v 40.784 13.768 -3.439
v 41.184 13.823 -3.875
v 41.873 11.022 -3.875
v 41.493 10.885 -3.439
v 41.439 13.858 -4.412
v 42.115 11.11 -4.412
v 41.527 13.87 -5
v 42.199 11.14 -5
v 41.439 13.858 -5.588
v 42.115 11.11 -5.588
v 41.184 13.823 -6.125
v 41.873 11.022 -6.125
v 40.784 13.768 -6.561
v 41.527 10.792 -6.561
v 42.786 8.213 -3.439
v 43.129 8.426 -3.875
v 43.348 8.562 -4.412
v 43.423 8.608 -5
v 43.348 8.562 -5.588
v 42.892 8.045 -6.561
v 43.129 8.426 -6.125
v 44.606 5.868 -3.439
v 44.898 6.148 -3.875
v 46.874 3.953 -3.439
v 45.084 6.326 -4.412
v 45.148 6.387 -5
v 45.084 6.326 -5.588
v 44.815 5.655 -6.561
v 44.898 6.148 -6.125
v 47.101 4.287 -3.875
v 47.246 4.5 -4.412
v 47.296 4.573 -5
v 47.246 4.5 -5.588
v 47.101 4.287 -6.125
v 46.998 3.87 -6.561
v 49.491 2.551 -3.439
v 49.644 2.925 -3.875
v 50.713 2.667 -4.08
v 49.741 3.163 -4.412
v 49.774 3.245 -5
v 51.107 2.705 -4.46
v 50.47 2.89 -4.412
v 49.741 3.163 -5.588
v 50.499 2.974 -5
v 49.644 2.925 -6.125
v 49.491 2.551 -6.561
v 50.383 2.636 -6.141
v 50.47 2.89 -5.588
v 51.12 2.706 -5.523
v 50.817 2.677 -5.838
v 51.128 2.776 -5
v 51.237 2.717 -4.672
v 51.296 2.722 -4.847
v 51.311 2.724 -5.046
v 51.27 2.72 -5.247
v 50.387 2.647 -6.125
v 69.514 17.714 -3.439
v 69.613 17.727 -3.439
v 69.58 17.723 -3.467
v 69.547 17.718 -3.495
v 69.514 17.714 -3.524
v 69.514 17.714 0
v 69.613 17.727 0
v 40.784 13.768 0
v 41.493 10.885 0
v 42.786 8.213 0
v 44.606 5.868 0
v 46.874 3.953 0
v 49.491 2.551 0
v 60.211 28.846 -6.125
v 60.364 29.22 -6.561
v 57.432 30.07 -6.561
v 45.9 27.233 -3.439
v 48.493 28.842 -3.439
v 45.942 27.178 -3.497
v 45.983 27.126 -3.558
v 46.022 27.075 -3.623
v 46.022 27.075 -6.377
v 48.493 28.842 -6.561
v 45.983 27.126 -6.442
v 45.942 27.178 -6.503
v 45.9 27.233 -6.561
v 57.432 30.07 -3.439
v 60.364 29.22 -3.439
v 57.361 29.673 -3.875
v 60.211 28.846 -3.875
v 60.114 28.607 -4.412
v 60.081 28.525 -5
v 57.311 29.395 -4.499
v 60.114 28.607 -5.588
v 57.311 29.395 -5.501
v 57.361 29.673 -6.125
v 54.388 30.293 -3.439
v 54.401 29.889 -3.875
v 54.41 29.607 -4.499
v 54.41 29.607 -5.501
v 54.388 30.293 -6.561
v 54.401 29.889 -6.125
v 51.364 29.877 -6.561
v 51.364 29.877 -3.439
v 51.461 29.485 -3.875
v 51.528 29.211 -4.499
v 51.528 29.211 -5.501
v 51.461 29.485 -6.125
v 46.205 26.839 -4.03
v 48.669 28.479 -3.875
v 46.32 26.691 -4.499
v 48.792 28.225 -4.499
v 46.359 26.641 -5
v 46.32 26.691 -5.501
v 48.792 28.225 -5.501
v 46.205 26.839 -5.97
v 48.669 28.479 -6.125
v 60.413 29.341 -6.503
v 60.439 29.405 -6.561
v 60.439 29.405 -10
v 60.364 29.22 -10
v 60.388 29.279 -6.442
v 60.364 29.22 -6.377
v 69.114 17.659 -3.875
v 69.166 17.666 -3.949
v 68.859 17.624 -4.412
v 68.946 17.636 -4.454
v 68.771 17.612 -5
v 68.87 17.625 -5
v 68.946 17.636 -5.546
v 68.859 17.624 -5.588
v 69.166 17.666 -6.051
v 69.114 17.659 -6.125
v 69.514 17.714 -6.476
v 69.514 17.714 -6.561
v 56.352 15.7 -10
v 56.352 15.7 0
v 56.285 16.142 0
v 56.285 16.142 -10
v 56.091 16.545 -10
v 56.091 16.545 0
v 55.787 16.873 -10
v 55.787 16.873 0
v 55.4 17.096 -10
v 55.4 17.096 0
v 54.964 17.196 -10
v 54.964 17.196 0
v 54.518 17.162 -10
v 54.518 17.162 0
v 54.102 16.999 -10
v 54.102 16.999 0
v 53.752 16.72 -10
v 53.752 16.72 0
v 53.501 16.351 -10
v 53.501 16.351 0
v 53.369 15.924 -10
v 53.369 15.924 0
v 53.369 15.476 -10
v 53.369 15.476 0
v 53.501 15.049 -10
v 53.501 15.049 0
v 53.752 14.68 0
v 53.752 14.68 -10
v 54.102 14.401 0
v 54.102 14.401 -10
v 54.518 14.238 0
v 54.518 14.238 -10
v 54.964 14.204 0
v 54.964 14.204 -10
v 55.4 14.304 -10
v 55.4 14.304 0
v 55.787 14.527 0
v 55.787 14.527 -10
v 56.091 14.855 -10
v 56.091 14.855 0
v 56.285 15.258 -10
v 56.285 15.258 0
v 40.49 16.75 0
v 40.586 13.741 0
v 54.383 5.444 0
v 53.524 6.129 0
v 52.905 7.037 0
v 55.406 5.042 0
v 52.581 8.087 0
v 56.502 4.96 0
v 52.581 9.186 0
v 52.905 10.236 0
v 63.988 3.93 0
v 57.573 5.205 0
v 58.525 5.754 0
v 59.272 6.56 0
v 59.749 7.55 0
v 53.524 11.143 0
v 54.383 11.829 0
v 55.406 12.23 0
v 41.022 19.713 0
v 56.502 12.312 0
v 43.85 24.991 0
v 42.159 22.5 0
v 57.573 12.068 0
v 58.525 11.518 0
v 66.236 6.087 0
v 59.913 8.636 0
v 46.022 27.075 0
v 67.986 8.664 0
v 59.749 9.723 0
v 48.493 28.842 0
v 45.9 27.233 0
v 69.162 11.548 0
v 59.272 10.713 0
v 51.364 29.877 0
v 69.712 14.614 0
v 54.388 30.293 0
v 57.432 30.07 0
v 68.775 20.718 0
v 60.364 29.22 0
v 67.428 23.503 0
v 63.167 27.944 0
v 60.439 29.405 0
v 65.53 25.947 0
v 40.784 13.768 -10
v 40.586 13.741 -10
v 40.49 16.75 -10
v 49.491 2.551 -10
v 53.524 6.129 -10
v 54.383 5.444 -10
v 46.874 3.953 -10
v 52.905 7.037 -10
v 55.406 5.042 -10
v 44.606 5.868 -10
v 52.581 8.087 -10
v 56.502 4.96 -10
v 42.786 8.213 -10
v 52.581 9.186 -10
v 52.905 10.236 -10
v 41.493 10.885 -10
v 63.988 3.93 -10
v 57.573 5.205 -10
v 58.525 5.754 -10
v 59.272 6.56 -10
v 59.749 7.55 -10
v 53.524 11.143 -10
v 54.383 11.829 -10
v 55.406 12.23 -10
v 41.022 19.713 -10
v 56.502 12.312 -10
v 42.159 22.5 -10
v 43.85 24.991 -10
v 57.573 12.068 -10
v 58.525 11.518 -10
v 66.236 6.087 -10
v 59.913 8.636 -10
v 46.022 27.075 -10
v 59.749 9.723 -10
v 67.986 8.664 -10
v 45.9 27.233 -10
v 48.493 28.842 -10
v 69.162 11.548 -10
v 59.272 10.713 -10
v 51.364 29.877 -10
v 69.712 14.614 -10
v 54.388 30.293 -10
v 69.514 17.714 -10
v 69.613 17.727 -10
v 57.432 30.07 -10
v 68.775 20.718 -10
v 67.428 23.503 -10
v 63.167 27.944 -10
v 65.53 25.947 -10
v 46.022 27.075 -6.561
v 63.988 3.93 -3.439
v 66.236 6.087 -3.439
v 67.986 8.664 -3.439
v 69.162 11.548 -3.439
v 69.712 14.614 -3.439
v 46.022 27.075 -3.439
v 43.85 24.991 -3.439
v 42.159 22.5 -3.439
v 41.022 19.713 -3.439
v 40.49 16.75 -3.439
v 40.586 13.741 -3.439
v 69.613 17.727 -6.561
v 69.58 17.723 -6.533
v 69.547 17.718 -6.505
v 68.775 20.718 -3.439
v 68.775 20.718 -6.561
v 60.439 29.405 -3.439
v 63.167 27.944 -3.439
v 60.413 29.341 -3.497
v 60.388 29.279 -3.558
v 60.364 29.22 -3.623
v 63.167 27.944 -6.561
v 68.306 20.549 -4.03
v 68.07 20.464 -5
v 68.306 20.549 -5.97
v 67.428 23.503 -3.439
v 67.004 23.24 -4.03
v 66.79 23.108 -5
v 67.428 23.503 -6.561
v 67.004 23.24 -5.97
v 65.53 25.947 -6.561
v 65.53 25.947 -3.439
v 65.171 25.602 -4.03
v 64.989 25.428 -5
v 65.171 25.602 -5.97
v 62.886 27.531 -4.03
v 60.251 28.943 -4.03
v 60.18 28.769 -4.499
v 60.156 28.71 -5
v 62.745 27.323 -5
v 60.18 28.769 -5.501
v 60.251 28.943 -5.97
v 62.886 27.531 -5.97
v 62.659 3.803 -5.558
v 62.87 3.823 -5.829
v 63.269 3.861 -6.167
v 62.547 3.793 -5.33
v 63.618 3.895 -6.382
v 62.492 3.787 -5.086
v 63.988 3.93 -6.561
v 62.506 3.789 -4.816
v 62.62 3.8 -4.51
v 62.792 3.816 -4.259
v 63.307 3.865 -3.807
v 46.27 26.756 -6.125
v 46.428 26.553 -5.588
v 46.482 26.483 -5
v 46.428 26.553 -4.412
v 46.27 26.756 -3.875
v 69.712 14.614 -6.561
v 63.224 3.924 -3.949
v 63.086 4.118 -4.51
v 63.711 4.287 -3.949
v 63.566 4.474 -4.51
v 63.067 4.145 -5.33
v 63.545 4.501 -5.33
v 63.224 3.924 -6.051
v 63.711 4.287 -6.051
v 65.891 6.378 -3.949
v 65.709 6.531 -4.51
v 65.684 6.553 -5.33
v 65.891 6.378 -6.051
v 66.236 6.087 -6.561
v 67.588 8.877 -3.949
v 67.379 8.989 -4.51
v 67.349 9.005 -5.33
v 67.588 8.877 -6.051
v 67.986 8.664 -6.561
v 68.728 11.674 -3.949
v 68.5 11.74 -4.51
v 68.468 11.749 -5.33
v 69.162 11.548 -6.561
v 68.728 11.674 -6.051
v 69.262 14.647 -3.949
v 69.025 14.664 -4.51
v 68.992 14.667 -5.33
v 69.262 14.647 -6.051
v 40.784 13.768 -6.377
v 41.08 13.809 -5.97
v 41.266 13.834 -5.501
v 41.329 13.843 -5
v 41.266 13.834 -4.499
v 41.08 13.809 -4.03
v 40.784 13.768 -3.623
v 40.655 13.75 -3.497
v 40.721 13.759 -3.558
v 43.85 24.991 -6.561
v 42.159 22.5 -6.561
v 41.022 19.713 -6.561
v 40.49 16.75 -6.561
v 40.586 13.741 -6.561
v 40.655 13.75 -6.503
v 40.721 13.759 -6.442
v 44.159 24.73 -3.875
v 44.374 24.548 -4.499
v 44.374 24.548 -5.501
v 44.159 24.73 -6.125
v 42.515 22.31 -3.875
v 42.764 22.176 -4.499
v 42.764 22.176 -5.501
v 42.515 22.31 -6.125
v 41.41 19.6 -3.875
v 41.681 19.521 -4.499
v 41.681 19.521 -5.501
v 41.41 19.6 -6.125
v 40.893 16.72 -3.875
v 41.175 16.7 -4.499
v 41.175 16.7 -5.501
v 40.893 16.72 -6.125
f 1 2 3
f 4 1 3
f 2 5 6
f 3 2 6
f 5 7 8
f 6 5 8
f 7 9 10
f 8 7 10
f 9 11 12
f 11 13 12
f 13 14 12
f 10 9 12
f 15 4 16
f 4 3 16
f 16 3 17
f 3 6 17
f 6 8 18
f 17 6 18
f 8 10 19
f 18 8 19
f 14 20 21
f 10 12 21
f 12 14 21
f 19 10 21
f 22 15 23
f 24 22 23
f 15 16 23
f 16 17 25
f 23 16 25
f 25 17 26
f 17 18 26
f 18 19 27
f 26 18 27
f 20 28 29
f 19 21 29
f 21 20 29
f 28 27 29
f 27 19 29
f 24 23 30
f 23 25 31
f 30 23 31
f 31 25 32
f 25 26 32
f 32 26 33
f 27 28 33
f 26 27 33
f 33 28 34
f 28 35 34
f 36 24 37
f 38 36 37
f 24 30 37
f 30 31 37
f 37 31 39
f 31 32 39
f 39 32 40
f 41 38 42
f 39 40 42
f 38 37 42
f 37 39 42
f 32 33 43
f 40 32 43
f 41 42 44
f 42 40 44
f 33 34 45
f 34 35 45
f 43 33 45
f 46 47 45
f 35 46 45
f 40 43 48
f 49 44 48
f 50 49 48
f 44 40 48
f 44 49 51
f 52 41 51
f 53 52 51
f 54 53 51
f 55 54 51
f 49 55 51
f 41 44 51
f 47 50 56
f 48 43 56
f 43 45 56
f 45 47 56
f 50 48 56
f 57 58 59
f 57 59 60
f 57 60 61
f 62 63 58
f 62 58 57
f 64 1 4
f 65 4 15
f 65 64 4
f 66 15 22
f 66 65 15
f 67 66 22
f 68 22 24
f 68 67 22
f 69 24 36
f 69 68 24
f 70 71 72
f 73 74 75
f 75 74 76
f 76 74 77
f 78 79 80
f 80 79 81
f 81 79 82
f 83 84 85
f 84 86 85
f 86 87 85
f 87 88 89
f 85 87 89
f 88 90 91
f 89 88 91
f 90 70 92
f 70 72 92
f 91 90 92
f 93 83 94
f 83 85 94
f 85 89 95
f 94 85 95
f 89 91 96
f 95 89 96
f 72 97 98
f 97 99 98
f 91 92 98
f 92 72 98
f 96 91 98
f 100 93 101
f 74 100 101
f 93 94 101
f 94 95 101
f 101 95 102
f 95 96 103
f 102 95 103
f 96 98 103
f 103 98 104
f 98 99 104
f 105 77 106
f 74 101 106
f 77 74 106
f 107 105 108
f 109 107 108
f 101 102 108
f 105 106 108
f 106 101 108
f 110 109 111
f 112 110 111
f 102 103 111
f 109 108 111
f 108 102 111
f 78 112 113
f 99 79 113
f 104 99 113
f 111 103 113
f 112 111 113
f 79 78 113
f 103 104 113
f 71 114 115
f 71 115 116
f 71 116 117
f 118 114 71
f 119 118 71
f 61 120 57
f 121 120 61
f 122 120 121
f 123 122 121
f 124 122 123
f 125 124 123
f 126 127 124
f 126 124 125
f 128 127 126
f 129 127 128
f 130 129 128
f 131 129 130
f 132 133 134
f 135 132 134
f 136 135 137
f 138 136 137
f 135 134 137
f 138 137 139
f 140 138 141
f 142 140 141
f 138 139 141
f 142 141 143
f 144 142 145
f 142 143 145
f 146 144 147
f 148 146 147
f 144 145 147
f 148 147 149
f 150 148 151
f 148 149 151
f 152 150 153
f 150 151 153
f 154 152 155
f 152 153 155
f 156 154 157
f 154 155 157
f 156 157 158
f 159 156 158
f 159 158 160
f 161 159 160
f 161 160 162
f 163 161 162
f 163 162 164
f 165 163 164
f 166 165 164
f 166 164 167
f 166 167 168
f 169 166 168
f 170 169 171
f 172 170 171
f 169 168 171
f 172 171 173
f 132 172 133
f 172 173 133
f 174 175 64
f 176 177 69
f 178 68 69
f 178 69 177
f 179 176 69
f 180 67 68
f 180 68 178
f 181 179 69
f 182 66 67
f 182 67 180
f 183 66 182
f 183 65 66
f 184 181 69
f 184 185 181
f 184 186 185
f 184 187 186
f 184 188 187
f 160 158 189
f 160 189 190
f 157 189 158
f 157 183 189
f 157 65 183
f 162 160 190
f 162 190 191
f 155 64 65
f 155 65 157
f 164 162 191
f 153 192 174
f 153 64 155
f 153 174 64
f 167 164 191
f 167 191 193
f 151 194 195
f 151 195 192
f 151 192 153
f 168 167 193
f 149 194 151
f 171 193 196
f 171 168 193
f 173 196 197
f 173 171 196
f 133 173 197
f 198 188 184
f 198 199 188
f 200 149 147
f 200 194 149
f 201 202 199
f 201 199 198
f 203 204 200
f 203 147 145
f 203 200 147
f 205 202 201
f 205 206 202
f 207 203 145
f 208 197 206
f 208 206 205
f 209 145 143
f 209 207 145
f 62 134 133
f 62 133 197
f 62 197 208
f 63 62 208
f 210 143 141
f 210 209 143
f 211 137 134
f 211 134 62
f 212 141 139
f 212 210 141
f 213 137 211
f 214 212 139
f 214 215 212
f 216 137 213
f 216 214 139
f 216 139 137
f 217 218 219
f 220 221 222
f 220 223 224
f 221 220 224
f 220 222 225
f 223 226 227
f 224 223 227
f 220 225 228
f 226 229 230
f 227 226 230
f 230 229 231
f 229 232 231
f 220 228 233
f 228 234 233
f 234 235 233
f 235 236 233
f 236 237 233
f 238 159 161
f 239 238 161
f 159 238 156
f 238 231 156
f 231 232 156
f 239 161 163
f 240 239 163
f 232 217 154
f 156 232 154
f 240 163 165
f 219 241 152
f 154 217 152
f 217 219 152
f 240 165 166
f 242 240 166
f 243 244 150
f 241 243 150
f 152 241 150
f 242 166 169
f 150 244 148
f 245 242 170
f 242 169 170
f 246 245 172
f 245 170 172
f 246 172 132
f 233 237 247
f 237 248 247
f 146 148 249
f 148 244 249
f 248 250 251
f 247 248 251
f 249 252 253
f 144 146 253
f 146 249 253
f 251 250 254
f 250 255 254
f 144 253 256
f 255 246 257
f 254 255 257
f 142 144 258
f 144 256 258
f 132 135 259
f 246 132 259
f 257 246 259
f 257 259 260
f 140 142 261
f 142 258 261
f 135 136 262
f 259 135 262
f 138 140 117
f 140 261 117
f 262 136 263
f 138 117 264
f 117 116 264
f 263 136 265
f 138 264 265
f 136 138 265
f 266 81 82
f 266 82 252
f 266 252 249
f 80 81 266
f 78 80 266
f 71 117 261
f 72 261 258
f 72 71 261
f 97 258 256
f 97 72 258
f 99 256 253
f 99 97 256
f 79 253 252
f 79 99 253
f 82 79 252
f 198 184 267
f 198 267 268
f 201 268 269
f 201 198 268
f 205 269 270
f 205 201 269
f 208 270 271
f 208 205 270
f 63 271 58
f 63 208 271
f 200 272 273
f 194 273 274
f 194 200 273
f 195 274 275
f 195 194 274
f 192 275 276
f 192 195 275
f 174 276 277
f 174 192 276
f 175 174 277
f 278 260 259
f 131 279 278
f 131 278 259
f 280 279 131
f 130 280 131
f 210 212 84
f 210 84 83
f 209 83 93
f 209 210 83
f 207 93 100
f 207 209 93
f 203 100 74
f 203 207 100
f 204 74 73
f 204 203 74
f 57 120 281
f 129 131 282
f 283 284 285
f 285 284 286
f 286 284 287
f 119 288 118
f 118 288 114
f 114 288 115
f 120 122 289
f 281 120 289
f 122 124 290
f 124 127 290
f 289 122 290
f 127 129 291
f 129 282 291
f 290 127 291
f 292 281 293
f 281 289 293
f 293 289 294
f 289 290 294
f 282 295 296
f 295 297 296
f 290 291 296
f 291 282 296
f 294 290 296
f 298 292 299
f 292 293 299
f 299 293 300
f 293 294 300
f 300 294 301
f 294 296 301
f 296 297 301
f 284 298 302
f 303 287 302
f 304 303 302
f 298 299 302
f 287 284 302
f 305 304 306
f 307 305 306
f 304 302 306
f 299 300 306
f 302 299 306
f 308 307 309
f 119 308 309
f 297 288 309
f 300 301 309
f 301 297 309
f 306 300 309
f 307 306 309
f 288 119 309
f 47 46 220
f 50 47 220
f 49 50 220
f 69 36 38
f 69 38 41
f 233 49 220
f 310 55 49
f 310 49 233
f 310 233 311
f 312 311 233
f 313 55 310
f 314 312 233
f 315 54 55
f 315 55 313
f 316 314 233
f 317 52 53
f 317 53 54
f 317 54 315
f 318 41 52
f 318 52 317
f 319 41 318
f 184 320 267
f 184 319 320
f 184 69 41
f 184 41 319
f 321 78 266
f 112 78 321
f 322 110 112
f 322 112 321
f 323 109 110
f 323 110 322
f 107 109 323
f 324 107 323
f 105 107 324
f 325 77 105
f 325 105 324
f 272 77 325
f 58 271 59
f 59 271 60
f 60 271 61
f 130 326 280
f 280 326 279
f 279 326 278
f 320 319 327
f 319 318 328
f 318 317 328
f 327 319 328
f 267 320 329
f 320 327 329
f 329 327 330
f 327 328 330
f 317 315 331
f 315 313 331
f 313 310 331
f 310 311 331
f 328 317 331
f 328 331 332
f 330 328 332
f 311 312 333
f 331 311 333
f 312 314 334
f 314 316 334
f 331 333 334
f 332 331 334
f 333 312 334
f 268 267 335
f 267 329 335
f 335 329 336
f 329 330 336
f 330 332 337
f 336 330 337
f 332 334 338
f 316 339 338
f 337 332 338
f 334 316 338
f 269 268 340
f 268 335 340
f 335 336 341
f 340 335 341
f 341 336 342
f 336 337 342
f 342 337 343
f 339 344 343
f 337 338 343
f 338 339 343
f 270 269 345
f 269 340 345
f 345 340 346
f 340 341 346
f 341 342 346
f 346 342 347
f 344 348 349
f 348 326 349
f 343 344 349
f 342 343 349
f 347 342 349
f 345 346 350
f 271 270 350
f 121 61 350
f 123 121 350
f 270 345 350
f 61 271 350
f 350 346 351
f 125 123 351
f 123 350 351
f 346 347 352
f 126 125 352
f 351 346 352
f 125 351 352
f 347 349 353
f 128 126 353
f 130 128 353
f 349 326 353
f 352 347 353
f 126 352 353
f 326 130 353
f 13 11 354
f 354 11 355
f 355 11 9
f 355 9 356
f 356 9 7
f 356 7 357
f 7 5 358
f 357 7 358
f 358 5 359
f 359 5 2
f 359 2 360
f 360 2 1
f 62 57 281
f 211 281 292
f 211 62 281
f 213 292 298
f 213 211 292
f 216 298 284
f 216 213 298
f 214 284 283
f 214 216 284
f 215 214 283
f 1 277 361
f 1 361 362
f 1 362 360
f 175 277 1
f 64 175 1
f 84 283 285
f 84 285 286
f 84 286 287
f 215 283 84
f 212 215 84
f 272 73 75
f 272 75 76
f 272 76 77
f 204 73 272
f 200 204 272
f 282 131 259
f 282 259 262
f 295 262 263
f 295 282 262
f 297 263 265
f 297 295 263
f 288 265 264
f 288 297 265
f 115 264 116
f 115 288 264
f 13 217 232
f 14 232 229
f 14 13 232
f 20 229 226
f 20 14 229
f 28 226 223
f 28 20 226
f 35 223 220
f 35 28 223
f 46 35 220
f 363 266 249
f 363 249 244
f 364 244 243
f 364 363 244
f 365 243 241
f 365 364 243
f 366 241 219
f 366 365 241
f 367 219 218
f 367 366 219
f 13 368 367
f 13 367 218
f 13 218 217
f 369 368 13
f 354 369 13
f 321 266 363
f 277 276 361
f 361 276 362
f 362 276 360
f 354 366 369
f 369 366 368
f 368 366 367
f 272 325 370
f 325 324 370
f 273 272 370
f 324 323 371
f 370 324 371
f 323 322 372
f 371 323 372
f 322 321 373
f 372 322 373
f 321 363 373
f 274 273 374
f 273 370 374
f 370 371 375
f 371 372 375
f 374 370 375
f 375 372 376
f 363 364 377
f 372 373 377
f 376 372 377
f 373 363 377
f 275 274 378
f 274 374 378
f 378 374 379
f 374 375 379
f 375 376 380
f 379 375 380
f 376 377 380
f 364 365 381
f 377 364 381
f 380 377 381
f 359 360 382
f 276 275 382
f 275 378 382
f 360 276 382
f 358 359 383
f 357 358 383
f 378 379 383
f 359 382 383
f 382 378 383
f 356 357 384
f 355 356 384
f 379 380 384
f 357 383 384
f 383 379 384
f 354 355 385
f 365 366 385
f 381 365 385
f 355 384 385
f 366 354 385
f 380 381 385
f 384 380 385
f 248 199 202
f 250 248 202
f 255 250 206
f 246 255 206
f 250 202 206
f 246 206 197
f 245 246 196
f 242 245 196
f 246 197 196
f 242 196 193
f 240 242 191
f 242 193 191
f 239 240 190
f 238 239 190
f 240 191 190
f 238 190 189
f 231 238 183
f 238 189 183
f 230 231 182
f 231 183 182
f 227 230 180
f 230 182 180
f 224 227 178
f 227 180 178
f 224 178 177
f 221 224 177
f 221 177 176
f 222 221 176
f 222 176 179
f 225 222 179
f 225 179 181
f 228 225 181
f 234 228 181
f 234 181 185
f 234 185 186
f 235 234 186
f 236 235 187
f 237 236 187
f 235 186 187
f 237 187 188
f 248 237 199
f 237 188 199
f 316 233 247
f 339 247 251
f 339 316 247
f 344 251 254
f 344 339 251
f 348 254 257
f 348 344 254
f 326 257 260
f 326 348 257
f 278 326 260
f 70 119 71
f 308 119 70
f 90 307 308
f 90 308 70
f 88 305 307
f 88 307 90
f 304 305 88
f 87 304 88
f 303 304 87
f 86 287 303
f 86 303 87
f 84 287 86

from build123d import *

# Parameters (mm, degrees)
SKETCH1_R           = 3.686275202
SKETCH1_R_2         = 1.5
BOSS_EXTRUDE1_DEPTH = 10
CUT_SWEEP1_ANGLE    = 65.162978
SKETCH3_R           = 2
SKETCH4_R           = 2
SKETCH5_R           = 2
CUT_SWEEP5_ANGLE    = 66.926183


# Read off the part's stored shape, not the designer's step: Cut-Sweep1, Cut-Sweep5
with BuildPart() as part:
    # Sketch1 → Boss-Extrude1 (new body)
    with BuildSketch(Plane.XY):
        with BuildLine():
            Line((49.491190341, 2.55078162), (63.988368206, 3.929851578))
            ThreePointArc((63.988368206, 3.929851578), (68.649398374, 10.07494702), (69.613421186, 17.727270865))
            Line((69.613421186, 17.727270865), (69.514351105, 17.71366502))
            ThreePointArc((69.514351105, 17.71366502), (66.543133225, 24.775071071), (60.439280034, 29.404819157))
            Line((60.439280034, 29.404819157), (60.363775967, 29.219618898))
            ThreePointArc((60.363775967, 29.219618898), (52.865525757, 30.164231855), (45.899544112, 27.233165568))
            Line((45.899544112, 27.233165568), (46.022180208, 27.075176998))
            ThreePointArc((46.022180208, 27.075176998), (41.517560448, 21.136292813), (40.585887394, 13.740758359))
            Line((40.585887394, 13.740758359), (40.784027557, 13.767970048))
            ThreePointArc((40.784027557, 13.767970048), (43.634790659, 6.992837216), (49.491190341, 2.55078162))
        make_face()
        with Locations((56.226488574, 8.636175254)):
            Circle(SKETCH1_R, mode=Mode.SUBTRACT)
        with Locations((54.851979087, 15.7)):
            Circle(SKETCH1_R_2, mode=Mode.SUBTRACT)
    extrude(amount=-BOSS_EXTRUDE1_DEPTH)

    # Cut-Sweep1 outline → Cut-Sweep1 (revolve, cut)
    with BuildSketch(Plane(origin=(54.851979087, 15.7, 0), x_dir=(0.5396064408716191, -0.8419173884472655, 0), z_dir=(-0.8419173884472655, -0.5396064408716191, 0))):
        with BuildLine():
            Line((14.9, -6.5612495), (14.9, -3.4387505))
            ThreePointArc((14.9, -3.4387505), (14.15, -5), (14.9, -6.5612495))
        make_face()
    revolve(axis=Axis((54.851979087, 15.7, 0), (0, 0, 1)), revolution_arc=CUT_SWEEP1_ANGLE, mode=Mode.SUBTRACT)

    # Cut-Sweep2: sweep along a curve in space
    with BuildLine() as cut_sweep2_path:
        ThreePointArc((69.514351105, 17.71366502, 0), (66.543133225, 24.775071071, 0), (60.439280034, 29.404819157, 0))
    # Sketch3 → Cut-Sweep2 (sweep, cut)
    with BuildSketch(Plane(origin=(41.545913318, -16.937802546, 0), x_dir=(0, 0, 1), z_dir=(-0.9260012944005722, 0.37752033424501136, 0))):
        with Locations((-5, 51.295957801)):
            Circle(SKETCH3_R)
    sweep(path=cut_sweep2_path.line, mode=Mode.SUBTRACT)

    # Cut-Sweep3: sweep along a curve in space
    with BuildLine() as cut_sweep3_path:
        ThreePointArc((60.363775967, 29.219618898, 0), (52.865525757, 30.164231855, 0), (45.899544112, 27.233165568, 0))
    # Sketch4 → Cut-Sweep3 (sweep, cut)
    with BuildSketch(Plane(origin=(41.832894366, 32.472113961, 0), x_dir=(0, 0, 1), z_dir=(-0.7899428471017035, -0.6131804777656041, 0))):
        with Locations((-5, -5.382060044)):
            Circle(SKETCH4_R)
    sweep(path=cut_sweep3_path.line, mode=Mode.SUBTRACT)

    # Cut-Sweep4: sweep along a curve in space
    with BuildLine() as cut_sweep4_path:
        ThreePointArc((46.022180208, 27.075176998, 0), (41.517560448, 21.136292813, 0), (40.585887394, 13.740758359, 0))
    # Sketch5 → Cut-Sweep4 (sweep, cut)
    with BuildSketch(Plane(origin=(-1.100839052, 8.015688586, 0), x_dir=(0.9907008120106874, 0.13605844729881716, 0), z_dir=(0.13605844729881716, -0.9907008120106874, 0))):
        with Locations((40.828017845, -5)):
            Circle(SKETCH5_R)
    sweep(path=cut_sweep4_path.line, mode=Mode.SUBTRACT)

    # Cut-Sweep5 outline → Cut-Sweep5 (revolve, cut)
    with BuildSketch(Plane(origin=(54.851979087, 15.7, 0), x_dir=(-0.9907008120106691, -0.13605844729894895, 0), z_dir=(-0.13605844729894895, 0.9907008120106691, 0))):
        with BuildLine():
            ThreePointArc((14.20000016, -3.438750372), (13.45, -5.000000221), (14.200000505, -6.561249904))
            Line((14.200000505, -6.561249904), (14.20000016, -3.438750372))
        make_face()
    revolve(axis=Axis((54.851979087, 15.7, 0), (0, 0, 1)), revolution_arc=CUT_SWEEP5_ANGLE, mode=Mode.SUBTRACT)


solid = part.part
